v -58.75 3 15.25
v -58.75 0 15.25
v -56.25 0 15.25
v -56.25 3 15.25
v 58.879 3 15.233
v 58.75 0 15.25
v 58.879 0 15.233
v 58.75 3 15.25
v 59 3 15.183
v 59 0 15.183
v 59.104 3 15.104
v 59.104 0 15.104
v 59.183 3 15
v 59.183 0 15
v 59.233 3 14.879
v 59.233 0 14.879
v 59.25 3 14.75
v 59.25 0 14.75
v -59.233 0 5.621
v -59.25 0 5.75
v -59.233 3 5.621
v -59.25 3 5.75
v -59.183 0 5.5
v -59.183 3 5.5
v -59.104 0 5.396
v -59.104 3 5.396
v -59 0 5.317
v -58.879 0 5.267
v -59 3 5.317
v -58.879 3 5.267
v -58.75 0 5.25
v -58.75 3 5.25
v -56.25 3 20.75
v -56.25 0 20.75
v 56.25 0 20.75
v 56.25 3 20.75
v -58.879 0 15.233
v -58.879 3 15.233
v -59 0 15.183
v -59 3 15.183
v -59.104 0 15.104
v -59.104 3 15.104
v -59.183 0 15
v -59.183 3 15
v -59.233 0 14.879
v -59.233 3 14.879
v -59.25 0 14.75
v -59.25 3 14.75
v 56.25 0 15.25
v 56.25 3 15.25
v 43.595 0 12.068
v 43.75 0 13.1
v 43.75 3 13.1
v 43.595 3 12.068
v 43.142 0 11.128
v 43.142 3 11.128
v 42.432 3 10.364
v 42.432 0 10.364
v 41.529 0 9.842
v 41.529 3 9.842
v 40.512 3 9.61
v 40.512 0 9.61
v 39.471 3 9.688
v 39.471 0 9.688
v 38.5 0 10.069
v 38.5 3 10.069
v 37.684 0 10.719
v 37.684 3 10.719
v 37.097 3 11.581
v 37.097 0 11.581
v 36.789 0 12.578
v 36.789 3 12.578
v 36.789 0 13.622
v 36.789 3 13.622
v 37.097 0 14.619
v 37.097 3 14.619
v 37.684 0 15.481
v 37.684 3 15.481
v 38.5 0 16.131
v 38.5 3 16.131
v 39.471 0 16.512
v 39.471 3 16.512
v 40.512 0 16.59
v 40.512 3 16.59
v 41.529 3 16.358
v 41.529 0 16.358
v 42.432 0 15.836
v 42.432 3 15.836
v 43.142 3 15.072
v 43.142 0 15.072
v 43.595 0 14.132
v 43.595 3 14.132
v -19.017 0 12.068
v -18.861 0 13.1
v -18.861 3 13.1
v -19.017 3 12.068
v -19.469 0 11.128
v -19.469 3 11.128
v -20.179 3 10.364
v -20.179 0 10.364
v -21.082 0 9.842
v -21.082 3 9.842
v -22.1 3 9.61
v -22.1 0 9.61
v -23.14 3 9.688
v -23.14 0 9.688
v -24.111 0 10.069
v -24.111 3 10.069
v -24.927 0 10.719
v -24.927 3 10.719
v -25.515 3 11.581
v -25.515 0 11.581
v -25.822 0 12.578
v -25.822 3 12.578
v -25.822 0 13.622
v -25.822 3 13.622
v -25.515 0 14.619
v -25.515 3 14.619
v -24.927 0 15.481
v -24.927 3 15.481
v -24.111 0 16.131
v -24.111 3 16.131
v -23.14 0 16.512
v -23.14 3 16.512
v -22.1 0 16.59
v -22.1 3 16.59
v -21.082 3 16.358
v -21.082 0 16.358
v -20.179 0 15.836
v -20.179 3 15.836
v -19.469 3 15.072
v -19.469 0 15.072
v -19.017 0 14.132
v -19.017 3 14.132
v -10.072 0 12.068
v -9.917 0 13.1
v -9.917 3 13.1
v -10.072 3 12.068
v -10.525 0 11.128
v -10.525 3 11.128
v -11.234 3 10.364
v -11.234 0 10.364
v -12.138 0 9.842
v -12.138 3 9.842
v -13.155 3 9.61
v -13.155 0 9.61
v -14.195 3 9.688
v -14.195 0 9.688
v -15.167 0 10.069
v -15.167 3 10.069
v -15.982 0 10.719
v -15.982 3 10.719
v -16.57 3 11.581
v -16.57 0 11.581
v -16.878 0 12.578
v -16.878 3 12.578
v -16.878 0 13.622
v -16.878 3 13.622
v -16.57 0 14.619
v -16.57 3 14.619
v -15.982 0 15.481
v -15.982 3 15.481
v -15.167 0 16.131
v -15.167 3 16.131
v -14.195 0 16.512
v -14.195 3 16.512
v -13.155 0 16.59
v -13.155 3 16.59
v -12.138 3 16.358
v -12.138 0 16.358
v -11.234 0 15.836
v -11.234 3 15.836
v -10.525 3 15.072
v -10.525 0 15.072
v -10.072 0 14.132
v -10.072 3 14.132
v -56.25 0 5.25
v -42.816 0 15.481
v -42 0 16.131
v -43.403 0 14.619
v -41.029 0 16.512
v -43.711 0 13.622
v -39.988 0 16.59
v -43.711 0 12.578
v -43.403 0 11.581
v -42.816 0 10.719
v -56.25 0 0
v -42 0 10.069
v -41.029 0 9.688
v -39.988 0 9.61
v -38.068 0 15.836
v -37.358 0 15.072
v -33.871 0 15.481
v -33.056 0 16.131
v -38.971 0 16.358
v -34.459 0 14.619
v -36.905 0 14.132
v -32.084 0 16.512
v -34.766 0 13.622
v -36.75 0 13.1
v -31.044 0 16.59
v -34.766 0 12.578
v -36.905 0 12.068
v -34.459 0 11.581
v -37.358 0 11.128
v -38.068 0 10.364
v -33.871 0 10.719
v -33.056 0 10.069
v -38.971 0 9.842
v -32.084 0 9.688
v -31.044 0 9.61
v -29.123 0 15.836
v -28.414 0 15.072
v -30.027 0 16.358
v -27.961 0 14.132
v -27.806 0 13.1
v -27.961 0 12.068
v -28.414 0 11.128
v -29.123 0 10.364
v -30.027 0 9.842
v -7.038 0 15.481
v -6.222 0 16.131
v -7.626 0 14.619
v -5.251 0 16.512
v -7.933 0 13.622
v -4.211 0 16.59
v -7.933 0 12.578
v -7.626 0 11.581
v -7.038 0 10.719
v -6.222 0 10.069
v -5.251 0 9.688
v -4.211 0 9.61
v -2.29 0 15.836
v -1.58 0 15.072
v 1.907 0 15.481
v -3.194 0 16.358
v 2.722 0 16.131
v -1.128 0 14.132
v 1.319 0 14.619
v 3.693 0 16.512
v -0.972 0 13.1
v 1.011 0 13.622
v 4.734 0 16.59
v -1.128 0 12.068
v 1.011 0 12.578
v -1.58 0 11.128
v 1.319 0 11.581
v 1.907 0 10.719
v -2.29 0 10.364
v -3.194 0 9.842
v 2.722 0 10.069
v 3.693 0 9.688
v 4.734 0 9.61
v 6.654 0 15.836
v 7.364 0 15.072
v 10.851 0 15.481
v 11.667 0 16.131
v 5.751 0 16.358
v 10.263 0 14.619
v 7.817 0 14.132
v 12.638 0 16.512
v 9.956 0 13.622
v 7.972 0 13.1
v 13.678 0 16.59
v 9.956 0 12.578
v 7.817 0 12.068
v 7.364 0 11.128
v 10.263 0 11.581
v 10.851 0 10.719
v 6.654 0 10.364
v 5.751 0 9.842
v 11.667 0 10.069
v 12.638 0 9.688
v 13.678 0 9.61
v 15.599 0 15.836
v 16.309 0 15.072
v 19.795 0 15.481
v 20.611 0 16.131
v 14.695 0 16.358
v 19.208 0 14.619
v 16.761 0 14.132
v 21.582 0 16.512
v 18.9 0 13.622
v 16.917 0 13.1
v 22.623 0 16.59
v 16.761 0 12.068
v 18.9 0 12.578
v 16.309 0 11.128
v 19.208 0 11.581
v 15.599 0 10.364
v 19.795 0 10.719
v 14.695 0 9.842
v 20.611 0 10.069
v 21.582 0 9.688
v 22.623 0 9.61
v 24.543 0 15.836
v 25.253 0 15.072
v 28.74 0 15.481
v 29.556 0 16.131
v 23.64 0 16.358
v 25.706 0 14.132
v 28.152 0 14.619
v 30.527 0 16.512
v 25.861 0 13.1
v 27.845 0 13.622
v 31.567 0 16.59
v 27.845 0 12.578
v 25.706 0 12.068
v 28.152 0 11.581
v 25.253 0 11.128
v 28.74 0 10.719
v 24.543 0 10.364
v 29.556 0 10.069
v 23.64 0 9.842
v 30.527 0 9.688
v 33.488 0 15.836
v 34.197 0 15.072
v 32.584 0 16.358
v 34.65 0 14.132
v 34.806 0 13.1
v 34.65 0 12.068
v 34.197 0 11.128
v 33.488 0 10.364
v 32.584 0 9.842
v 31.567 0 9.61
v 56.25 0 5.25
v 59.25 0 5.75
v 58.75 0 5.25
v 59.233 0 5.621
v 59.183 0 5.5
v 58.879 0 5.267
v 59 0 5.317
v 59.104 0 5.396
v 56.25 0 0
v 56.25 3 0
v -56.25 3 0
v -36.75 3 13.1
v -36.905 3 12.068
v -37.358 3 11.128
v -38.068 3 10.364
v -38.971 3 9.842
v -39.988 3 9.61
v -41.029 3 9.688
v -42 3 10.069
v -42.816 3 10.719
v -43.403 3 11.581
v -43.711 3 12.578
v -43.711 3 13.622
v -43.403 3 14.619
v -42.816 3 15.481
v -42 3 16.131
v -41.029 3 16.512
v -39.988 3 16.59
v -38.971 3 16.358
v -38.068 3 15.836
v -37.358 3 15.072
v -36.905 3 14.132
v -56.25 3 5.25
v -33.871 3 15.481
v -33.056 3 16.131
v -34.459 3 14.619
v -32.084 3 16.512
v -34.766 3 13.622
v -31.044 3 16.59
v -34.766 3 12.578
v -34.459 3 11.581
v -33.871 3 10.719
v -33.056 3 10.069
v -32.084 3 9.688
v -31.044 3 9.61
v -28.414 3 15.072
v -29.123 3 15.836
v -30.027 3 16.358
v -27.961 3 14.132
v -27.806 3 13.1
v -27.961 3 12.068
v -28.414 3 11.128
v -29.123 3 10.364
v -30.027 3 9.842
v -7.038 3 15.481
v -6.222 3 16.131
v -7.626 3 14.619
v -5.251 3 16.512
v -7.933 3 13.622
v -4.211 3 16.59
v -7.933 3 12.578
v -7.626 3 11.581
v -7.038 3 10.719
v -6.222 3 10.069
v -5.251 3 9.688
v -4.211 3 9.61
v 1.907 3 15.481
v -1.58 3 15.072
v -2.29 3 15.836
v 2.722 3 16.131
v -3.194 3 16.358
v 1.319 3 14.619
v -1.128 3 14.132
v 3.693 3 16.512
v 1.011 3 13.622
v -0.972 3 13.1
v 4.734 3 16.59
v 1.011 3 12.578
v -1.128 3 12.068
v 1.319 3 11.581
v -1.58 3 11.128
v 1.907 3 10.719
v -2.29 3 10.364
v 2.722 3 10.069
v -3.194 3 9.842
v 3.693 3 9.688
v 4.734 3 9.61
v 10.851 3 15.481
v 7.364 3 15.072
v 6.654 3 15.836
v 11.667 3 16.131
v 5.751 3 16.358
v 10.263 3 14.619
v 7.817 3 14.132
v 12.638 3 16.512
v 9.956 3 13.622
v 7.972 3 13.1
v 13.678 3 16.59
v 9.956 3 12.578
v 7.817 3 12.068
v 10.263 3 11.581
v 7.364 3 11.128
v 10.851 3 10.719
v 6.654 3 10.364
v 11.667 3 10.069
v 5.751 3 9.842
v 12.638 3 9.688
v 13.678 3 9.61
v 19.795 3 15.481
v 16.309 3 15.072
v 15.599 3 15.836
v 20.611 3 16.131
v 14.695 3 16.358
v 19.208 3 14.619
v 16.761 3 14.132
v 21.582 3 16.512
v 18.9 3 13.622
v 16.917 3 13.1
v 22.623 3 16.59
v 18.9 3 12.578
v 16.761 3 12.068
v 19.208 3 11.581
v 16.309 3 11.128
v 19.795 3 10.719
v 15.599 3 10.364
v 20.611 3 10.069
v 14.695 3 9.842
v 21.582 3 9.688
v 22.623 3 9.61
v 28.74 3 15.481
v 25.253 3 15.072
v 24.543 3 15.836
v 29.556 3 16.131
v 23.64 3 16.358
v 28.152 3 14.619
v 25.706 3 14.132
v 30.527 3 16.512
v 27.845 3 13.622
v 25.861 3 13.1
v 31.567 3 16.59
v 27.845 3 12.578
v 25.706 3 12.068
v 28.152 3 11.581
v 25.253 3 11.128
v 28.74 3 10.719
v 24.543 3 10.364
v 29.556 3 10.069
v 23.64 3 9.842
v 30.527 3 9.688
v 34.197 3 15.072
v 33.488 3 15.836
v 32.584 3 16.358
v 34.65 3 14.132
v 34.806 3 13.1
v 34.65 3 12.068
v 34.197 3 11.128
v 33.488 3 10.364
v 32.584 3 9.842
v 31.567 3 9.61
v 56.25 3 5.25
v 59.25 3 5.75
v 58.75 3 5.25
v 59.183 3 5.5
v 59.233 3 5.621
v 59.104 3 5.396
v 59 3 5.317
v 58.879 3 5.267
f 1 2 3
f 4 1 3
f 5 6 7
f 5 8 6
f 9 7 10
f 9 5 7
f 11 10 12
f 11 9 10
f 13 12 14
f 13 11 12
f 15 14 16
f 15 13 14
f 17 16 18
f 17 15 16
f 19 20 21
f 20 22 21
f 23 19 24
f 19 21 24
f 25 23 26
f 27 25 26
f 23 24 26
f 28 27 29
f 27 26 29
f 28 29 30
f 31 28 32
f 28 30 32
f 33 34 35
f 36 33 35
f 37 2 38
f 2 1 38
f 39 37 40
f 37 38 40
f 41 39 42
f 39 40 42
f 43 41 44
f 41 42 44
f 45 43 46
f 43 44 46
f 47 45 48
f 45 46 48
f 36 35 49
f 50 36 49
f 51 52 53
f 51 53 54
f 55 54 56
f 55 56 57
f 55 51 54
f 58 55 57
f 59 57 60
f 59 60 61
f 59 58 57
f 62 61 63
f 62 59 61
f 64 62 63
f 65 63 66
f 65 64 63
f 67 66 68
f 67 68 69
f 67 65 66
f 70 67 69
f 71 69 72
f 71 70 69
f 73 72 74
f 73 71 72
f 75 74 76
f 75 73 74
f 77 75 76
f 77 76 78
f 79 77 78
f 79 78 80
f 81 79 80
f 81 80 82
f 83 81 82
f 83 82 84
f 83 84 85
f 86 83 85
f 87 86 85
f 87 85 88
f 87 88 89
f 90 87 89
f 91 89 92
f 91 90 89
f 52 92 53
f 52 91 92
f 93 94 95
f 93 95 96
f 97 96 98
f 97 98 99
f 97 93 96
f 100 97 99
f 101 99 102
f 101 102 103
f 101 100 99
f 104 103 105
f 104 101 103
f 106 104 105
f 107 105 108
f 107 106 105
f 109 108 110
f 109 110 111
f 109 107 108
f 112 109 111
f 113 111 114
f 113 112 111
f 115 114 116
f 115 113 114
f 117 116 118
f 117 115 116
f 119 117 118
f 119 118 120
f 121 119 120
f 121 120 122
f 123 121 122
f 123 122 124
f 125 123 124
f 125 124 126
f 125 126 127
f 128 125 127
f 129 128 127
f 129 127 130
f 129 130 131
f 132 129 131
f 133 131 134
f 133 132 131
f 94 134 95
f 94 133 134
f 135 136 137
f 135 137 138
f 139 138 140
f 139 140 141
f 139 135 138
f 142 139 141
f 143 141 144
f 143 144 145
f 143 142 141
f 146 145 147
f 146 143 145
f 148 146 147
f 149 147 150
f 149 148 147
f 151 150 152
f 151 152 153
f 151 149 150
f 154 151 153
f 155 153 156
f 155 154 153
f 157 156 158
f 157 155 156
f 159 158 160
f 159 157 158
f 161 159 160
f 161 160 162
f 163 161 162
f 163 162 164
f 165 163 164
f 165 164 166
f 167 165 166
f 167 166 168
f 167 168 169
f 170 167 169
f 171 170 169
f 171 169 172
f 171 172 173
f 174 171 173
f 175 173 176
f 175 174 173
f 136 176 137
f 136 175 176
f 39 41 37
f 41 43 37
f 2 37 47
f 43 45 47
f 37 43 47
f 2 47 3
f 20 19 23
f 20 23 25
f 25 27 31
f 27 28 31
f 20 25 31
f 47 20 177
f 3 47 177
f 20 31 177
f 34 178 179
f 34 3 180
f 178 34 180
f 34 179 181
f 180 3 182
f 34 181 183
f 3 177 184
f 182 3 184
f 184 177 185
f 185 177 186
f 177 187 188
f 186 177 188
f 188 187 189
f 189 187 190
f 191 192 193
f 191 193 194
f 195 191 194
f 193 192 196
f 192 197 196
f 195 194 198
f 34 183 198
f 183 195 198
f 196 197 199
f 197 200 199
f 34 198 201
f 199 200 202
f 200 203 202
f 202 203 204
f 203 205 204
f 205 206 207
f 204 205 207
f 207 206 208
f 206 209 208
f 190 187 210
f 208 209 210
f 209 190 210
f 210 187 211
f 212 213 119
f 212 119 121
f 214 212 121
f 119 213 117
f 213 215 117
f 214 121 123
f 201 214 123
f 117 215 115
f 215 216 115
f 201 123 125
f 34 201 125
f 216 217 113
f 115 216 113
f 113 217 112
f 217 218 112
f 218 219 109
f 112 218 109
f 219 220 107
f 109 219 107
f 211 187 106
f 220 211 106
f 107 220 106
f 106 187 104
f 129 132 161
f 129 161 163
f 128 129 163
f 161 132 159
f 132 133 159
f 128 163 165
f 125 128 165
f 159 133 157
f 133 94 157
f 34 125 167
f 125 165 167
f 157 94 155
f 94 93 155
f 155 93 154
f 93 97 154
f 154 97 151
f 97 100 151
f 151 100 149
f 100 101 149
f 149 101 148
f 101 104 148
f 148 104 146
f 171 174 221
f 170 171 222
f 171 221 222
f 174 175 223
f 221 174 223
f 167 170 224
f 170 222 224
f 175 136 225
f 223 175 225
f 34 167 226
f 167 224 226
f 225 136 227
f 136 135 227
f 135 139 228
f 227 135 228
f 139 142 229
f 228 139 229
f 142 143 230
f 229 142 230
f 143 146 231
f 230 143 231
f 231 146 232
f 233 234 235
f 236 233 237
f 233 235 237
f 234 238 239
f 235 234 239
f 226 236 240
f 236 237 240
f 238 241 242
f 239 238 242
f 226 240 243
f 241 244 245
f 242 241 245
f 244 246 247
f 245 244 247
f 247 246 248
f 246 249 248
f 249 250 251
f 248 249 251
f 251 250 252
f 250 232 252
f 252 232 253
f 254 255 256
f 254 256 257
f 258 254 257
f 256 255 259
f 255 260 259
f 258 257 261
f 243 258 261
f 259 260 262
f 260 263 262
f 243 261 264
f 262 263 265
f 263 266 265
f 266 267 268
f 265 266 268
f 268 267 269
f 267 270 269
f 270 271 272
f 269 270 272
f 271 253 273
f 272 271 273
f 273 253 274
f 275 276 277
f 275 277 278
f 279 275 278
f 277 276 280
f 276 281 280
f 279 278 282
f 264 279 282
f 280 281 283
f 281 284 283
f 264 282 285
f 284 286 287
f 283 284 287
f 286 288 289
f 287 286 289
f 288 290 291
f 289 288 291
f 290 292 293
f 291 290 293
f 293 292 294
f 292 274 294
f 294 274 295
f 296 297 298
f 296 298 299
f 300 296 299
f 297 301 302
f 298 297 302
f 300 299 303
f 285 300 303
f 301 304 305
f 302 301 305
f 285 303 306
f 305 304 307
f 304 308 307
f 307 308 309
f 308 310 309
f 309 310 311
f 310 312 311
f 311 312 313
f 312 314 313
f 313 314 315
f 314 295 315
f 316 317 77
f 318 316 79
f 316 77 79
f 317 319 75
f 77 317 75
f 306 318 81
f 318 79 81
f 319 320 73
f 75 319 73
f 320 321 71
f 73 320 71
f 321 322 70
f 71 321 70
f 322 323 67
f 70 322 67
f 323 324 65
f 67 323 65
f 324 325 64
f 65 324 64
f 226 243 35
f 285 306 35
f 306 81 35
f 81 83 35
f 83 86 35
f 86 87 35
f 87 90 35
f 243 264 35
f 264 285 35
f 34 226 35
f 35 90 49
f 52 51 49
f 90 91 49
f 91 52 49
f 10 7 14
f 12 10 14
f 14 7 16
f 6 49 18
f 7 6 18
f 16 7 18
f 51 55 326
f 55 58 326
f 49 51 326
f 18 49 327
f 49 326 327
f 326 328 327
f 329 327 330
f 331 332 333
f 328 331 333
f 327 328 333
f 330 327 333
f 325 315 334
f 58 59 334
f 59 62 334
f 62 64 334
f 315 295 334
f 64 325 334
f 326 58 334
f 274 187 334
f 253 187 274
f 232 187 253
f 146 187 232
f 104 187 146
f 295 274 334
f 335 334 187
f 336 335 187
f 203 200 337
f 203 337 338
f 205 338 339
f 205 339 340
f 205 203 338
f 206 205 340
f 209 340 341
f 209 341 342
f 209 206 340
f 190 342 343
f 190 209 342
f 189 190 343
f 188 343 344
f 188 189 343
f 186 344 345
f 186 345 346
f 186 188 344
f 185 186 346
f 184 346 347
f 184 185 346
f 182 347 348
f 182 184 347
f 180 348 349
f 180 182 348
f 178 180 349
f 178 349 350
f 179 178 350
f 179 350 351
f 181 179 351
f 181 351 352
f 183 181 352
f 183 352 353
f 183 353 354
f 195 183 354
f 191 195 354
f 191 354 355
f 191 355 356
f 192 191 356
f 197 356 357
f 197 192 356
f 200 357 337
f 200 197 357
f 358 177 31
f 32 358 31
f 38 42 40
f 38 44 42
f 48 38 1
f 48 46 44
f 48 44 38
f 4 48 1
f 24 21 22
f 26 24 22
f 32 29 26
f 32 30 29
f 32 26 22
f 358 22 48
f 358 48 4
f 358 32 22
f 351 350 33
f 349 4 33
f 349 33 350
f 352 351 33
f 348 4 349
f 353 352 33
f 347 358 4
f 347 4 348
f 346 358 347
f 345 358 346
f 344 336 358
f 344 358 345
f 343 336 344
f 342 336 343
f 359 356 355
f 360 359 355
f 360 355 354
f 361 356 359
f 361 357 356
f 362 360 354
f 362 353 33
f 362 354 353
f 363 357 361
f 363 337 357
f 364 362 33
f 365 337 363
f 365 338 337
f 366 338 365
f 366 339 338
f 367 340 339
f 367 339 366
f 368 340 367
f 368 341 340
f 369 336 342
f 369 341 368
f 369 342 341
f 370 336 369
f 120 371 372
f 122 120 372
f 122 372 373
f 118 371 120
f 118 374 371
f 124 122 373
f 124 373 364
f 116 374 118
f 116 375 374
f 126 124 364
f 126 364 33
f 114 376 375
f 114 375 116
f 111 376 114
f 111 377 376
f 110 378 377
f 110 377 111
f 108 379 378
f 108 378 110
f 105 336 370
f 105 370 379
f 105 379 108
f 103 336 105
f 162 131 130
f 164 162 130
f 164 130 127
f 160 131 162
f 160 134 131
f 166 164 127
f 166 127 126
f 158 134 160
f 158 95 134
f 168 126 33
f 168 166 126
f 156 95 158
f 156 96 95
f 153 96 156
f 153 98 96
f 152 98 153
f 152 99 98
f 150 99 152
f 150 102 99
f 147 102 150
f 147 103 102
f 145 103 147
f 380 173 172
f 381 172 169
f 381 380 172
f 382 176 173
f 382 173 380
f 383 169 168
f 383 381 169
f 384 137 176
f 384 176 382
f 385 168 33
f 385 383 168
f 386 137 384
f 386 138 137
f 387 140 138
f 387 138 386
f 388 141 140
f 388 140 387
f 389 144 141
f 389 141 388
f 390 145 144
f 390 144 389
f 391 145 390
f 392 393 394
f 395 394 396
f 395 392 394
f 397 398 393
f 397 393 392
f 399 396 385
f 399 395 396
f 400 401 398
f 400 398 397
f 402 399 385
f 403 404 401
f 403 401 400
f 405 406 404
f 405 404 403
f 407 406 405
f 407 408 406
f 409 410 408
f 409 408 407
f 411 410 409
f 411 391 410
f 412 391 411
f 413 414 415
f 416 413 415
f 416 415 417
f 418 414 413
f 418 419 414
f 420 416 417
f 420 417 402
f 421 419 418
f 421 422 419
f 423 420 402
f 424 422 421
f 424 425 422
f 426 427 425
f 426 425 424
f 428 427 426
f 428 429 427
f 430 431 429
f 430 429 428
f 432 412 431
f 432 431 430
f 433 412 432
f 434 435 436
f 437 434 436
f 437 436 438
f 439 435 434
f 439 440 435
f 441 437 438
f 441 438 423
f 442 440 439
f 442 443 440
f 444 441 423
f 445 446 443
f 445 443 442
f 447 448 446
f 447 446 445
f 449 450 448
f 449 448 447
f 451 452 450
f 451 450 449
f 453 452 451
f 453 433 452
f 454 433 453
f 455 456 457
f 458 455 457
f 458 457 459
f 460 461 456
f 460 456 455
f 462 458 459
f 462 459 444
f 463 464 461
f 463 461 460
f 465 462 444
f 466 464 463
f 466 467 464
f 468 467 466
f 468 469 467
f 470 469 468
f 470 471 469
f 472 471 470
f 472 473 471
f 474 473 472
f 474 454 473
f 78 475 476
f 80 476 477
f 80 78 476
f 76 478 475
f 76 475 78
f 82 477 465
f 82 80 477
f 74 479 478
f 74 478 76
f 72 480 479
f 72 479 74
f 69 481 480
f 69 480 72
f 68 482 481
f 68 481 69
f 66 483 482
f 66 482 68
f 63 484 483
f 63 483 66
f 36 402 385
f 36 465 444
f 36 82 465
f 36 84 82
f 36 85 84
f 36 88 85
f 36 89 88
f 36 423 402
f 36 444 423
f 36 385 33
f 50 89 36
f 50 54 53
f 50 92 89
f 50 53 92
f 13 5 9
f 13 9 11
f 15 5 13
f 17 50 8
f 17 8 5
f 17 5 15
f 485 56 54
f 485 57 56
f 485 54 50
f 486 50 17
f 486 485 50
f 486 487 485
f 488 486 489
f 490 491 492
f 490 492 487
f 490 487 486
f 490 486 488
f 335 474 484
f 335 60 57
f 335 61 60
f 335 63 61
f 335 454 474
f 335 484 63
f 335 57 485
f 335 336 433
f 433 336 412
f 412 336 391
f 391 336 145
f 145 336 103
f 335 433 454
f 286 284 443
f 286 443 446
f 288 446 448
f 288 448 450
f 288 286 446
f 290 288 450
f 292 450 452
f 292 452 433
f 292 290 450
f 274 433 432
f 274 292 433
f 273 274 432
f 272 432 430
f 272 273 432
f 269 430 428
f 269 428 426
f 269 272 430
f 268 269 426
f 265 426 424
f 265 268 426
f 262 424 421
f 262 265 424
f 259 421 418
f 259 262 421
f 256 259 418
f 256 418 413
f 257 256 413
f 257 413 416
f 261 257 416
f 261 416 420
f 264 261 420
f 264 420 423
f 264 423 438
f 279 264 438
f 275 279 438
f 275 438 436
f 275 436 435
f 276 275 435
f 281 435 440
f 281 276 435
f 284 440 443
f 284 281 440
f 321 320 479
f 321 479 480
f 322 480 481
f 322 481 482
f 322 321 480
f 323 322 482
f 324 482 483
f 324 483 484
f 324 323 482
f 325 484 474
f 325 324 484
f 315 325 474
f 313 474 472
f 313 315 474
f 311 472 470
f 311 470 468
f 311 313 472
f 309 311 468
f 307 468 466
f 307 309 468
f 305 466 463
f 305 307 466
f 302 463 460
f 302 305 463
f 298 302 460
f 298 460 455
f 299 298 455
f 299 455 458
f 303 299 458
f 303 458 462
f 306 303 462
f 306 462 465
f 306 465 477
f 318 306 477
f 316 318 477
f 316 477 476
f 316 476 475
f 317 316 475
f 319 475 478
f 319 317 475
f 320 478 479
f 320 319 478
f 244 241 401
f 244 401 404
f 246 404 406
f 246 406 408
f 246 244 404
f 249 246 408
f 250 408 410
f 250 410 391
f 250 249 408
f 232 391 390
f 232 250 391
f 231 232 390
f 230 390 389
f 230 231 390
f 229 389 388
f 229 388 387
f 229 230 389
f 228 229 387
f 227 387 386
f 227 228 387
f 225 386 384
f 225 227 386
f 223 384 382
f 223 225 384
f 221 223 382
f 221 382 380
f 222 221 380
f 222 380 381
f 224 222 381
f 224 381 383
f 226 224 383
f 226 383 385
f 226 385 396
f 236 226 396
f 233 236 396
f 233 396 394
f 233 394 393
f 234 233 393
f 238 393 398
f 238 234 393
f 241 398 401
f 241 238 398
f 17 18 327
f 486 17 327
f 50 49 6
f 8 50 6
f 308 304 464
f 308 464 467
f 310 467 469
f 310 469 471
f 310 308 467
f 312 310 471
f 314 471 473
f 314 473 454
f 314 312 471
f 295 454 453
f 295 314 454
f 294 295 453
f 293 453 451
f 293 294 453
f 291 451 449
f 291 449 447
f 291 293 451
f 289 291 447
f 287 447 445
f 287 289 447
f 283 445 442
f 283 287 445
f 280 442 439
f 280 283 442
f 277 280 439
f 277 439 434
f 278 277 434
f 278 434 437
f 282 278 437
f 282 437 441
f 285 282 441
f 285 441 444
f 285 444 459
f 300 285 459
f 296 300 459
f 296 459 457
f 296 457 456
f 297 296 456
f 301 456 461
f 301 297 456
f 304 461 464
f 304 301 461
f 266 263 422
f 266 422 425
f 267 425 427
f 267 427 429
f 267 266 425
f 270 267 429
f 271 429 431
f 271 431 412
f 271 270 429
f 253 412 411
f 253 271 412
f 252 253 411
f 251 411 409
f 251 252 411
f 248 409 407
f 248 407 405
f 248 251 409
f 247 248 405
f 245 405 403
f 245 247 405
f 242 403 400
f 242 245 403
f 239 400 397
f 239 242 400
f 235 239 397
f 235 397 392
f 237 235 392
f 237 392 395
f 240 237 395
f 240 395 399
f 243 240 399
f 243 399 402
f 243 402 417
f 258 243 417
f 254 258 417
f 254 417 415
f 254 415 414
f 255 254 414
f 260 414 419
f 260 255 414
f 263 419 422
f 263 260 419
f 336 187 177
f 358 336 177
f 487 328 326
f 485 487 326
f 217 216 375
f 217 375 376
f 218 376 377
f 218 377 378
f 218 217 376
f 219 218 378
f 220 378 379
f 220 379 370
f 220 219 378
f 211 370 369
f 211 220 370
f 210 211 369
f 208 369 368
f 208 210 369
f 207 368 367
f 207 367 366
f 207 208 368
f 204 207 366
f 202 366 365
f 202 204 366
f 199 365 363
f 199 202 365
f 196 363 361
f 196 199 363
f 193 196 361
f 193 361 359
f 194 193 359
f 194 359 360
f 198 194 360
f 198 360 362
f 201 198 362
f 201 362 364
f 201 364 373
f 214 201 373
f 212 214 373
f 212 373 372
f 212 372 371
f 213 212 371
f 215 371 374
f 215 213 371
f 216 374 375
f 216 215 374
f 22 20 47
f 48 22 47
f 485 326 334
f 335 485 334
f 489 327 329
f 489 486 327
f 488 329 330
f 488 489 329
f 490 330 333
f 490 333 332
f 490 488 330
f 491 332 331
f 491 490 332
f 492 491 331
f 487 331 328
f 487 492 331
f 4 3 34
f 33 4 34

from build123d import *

# Parameters (mm, degrees)
SKETCH_1_R      = 3.5
EXTRUDE_1_DEPTH = 3
FILLET_1_R      = 0.5


with BuildPart() as part:
    # Эскиз1 → Бобышка-Вытянуть1 (new body)
    with BuildSketch(Plane(origin=(0, 0, 0), x_dir=(1, 0, 0), z_dir=(0, 1, 0))):
        Polygon((-56.25, -20.75), (56.25, -20.75), (56.25, -15.25), (59.25, -15.25), (59.25, -5.25), (56.25, -5.25), (56.25, 0), (-56.25, 0), (-56.25, -5.25), (-59.25, -5.25), (-59.25, -15.25), (-56.25, -15.25), align=None)
        with Locations((-40.25, -13.1)):
            Circle(SKETCH_1_R, mode=Mode.SUBTRACT)
        with Locations((-31.305555556, -13.1)):
            Circle(SKETCH_1_R, mode=Mode.SUBTRACT)
        with Locations((-22.361111111, -13.1)):
            Circle(SKETCH_1_R, mode=Mode.SUBTRACT)
        with Locations((-13.416666667, -13.1)):
            Circle(SKETCH_1_R, mode=Mode.SUBTRACT)
        with Locations((-4.472222222, -13.1)):
            Circle(SKETCH_1_R, mode=Mode.SUBTRACT)
        with Locations((4.472222222, -13.1)):
            Circle(SKETCH_1_R, mode=Mode.SUBTRACT)
        with Locations((13.416666667, -13.1)):
            Circle(SKETCH_1_R, mode=Mode.SUBTRACT)
        with Locations((22.361111111, -13.1)):
            Circle(SKETCH_1_R, mode=Mode.SUBTRACT)
        with Locations((31.305555556, -13.1)):
            Circle(SKETCH_1_R, mode=Mode.SUBTRACT)
        with Locations((40.25, -13.1)):
            Circle(SKETCH_1_R, mode=Mode.SUBTRACT)
    extrude(amount=EXTRUDE_1_DEPTH)

    # Скругление1
    fillet_1_edges = [part.edges().sort_by_distance(p)[0] for p in [
        (-59.25, 1.5, 15.25),
        (-59.25, 1.5, 5.25),
        (59.25, 1.5, 5.25),
        (59.25, 1.5, 15.25),
    ]]
    fillet(fillet_1_edges, radius=FILLET_1_R)


solid = part.part
